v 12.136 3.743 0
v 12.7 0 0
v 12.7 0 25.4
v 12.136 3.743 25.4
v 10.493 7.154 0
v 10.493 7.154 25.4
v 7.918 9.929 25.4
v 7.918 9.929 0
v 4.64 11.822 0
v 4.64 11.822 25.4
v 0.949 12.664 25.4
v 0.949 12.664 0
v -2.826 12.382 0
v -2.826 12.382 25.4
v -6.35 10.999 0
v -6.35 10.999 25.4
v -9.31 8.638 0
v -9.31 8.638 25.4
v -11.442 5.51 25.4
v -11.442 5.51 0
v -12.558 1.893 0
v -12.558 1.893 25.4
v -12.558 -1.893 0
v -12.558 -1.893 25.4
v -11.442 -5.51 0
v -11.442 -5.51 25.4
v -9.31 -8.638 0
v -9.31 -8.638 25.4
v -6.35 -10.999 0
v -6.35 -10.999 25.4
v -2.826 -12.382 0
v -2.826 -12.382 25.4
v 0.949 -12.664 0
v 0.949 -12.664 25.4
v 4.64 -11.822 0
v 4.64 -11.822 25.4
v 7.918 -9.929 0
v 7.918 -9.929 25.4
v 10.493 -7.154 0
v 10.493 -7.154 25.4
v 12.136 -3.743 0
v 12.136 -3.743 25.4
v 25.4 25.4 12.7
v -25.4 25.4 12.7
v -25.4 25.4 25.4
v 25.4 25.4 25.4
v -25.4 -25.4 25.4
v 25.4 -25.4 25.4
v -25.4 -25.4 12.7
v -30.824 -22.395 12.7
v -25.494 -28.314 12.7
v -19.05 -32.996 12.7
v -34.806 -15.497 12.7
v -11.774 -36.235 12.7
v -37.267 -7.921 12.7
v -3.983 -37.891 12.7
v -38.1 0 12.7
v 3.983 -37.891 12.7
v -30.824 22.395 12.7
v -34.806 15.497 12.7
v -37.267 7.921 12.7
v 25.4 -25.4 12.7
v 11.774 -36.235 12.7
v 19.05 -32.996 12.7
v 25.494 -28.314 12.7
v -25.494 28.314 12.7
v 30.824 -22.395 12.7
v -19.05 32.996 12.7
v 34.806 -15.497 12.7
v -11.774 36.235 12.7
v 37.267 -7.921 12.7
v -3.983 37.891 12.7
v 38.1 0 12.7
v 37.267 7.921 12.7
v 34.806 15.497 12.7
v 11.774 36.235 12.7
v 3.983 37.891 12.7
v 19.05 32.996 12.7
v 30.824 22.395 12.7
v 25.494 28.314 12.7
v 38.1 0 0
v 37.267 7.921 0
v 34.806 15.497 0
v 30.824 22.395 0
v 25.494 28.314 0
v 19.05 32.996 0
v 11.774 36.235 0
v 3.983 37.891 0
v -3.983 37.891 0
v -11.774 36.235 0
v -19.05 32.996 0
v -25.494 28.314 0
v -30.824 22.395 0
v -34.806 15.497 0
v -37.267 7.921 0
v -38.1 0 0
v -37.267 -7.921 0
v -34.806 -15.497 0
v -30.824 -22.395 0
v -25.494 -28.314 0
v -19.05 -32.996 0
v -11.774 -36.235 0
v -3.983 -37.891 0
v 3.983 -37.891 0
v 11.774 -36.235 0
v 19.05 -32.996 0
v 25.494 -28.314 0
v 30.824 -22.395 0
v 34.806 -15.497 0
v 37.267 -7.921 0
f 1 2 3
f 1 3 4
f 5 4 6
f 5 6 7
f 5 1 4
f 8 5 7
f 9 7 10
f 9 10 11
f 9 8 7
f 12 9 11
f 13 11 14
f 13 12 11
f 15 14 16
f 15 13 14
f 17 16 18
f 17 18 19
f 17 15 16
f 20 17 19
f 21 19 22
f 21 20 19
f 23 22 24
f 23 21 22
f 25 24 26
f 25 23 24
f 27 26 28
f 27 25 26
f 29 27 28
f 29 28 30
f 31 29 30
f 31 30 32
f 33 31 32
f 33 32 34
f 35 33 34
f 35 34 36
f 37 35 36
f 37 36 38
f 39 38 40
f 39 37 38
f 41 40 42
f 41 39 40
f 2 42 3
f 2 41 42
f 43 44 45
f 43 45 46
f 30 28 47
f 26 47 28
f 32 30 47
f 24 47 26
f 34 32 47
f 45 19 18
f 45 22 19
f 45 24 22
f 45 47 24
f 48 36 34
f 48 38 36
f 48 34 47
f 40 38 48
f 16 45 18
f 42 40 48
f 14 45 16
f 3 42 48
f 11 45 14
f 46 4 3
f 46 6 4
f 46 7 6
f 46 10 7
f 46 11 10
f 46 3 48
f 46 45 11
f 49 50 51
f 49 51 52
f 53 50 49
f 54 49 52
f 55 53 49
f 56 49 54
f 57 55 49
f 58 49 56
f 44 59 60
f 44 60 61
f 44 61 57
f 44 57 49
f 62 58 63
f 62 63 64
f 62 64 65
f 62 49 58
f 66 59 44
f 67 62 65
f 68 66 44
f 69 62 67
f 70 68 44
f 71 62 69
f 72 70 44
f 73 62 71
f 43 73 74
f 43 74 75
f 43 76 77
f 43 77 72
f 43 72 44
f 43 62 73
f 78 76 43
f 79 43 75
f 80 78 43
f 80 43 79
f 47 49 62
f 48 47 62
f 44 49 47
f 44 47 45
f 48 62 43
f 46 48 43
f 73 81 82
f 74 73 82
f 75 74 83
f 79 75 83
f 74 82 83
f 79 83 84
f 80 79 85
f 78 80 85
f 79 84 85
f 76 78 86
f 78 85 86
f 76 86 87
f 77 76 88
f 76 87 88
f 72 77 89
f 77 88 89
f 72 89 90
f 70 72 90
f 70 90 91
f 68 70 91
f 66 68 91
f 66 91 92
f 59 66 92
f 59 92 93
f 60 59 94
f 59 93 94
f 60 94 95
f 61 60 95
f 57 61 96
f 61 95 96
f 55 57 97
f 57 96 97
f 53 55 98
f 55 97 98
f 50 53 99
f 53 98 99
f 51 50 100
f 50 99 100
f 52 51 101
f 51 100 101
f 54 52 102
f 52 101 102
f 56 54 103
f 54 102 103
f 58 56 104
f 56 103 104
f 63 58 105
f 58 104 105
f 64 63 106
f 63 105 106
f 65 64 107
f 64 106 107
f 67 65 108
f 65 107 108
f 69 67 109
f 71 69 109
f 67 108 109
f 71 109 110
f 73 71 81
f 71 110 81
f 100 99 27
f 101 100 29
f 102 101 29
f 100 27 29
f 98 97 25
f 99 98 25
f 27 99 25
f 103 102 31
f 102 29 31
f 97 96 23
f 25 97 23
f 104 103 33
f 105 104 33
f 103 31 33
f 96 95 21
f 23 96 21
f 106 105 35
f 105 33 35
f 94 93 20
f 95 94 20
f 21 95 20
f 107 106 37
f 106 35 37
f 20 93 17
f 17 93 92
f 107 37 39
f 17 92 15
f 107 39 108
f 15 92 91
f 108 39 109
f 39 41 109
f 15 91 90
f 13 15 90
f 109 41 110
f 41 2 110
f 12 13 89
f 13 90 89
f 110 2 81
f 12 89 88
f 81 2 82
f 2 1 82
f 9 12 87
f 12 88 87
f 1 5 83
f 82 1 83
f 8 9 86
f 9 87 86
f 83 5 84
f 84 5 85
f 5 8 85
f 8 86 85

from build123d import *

# Parameters (mm, degrees)
F0_R     = 38.1
F0_W     = 50.8
F0_H     = 50.8
F0_R_2   = 12.7
F1_DEPTH = 12.7
F2_W     = 50.8
F2_H     = 50.8
F3_DEPTH = 25.4
F4_R     = 12.7
F5_DEPTH = 25.4


with BuildPart() as f1:
    # F0 (on Top) → F1 (new body)
    with BuildSketch(Plane.XY):
        Circle(F0_R)
        Rectangle(F0_W, F0_H, mode=Mode.SUBTRACT)
        Rectangle(F0_W, F0_H)
        Circle(F0_R_2, mode=Mode.SUBTRACT)
        Circle(F0_R_2)
    extrude(amount=F1_DEPTH)

    # F2 (on Top) → F3 (join)
    with BuildSketch(Plane.XY):
        Rectangle(F2_W, F2_H)
    extrude(amount=F3_DEPTH)

    # F4 (on Top) → F5 (cut)
    with BuildSketch(Plane.XY):
        Circle(F4_R)
    extrude(amount=F5_DEPTH, mode=Mode.SUBTRACT)


solid = f1.part
